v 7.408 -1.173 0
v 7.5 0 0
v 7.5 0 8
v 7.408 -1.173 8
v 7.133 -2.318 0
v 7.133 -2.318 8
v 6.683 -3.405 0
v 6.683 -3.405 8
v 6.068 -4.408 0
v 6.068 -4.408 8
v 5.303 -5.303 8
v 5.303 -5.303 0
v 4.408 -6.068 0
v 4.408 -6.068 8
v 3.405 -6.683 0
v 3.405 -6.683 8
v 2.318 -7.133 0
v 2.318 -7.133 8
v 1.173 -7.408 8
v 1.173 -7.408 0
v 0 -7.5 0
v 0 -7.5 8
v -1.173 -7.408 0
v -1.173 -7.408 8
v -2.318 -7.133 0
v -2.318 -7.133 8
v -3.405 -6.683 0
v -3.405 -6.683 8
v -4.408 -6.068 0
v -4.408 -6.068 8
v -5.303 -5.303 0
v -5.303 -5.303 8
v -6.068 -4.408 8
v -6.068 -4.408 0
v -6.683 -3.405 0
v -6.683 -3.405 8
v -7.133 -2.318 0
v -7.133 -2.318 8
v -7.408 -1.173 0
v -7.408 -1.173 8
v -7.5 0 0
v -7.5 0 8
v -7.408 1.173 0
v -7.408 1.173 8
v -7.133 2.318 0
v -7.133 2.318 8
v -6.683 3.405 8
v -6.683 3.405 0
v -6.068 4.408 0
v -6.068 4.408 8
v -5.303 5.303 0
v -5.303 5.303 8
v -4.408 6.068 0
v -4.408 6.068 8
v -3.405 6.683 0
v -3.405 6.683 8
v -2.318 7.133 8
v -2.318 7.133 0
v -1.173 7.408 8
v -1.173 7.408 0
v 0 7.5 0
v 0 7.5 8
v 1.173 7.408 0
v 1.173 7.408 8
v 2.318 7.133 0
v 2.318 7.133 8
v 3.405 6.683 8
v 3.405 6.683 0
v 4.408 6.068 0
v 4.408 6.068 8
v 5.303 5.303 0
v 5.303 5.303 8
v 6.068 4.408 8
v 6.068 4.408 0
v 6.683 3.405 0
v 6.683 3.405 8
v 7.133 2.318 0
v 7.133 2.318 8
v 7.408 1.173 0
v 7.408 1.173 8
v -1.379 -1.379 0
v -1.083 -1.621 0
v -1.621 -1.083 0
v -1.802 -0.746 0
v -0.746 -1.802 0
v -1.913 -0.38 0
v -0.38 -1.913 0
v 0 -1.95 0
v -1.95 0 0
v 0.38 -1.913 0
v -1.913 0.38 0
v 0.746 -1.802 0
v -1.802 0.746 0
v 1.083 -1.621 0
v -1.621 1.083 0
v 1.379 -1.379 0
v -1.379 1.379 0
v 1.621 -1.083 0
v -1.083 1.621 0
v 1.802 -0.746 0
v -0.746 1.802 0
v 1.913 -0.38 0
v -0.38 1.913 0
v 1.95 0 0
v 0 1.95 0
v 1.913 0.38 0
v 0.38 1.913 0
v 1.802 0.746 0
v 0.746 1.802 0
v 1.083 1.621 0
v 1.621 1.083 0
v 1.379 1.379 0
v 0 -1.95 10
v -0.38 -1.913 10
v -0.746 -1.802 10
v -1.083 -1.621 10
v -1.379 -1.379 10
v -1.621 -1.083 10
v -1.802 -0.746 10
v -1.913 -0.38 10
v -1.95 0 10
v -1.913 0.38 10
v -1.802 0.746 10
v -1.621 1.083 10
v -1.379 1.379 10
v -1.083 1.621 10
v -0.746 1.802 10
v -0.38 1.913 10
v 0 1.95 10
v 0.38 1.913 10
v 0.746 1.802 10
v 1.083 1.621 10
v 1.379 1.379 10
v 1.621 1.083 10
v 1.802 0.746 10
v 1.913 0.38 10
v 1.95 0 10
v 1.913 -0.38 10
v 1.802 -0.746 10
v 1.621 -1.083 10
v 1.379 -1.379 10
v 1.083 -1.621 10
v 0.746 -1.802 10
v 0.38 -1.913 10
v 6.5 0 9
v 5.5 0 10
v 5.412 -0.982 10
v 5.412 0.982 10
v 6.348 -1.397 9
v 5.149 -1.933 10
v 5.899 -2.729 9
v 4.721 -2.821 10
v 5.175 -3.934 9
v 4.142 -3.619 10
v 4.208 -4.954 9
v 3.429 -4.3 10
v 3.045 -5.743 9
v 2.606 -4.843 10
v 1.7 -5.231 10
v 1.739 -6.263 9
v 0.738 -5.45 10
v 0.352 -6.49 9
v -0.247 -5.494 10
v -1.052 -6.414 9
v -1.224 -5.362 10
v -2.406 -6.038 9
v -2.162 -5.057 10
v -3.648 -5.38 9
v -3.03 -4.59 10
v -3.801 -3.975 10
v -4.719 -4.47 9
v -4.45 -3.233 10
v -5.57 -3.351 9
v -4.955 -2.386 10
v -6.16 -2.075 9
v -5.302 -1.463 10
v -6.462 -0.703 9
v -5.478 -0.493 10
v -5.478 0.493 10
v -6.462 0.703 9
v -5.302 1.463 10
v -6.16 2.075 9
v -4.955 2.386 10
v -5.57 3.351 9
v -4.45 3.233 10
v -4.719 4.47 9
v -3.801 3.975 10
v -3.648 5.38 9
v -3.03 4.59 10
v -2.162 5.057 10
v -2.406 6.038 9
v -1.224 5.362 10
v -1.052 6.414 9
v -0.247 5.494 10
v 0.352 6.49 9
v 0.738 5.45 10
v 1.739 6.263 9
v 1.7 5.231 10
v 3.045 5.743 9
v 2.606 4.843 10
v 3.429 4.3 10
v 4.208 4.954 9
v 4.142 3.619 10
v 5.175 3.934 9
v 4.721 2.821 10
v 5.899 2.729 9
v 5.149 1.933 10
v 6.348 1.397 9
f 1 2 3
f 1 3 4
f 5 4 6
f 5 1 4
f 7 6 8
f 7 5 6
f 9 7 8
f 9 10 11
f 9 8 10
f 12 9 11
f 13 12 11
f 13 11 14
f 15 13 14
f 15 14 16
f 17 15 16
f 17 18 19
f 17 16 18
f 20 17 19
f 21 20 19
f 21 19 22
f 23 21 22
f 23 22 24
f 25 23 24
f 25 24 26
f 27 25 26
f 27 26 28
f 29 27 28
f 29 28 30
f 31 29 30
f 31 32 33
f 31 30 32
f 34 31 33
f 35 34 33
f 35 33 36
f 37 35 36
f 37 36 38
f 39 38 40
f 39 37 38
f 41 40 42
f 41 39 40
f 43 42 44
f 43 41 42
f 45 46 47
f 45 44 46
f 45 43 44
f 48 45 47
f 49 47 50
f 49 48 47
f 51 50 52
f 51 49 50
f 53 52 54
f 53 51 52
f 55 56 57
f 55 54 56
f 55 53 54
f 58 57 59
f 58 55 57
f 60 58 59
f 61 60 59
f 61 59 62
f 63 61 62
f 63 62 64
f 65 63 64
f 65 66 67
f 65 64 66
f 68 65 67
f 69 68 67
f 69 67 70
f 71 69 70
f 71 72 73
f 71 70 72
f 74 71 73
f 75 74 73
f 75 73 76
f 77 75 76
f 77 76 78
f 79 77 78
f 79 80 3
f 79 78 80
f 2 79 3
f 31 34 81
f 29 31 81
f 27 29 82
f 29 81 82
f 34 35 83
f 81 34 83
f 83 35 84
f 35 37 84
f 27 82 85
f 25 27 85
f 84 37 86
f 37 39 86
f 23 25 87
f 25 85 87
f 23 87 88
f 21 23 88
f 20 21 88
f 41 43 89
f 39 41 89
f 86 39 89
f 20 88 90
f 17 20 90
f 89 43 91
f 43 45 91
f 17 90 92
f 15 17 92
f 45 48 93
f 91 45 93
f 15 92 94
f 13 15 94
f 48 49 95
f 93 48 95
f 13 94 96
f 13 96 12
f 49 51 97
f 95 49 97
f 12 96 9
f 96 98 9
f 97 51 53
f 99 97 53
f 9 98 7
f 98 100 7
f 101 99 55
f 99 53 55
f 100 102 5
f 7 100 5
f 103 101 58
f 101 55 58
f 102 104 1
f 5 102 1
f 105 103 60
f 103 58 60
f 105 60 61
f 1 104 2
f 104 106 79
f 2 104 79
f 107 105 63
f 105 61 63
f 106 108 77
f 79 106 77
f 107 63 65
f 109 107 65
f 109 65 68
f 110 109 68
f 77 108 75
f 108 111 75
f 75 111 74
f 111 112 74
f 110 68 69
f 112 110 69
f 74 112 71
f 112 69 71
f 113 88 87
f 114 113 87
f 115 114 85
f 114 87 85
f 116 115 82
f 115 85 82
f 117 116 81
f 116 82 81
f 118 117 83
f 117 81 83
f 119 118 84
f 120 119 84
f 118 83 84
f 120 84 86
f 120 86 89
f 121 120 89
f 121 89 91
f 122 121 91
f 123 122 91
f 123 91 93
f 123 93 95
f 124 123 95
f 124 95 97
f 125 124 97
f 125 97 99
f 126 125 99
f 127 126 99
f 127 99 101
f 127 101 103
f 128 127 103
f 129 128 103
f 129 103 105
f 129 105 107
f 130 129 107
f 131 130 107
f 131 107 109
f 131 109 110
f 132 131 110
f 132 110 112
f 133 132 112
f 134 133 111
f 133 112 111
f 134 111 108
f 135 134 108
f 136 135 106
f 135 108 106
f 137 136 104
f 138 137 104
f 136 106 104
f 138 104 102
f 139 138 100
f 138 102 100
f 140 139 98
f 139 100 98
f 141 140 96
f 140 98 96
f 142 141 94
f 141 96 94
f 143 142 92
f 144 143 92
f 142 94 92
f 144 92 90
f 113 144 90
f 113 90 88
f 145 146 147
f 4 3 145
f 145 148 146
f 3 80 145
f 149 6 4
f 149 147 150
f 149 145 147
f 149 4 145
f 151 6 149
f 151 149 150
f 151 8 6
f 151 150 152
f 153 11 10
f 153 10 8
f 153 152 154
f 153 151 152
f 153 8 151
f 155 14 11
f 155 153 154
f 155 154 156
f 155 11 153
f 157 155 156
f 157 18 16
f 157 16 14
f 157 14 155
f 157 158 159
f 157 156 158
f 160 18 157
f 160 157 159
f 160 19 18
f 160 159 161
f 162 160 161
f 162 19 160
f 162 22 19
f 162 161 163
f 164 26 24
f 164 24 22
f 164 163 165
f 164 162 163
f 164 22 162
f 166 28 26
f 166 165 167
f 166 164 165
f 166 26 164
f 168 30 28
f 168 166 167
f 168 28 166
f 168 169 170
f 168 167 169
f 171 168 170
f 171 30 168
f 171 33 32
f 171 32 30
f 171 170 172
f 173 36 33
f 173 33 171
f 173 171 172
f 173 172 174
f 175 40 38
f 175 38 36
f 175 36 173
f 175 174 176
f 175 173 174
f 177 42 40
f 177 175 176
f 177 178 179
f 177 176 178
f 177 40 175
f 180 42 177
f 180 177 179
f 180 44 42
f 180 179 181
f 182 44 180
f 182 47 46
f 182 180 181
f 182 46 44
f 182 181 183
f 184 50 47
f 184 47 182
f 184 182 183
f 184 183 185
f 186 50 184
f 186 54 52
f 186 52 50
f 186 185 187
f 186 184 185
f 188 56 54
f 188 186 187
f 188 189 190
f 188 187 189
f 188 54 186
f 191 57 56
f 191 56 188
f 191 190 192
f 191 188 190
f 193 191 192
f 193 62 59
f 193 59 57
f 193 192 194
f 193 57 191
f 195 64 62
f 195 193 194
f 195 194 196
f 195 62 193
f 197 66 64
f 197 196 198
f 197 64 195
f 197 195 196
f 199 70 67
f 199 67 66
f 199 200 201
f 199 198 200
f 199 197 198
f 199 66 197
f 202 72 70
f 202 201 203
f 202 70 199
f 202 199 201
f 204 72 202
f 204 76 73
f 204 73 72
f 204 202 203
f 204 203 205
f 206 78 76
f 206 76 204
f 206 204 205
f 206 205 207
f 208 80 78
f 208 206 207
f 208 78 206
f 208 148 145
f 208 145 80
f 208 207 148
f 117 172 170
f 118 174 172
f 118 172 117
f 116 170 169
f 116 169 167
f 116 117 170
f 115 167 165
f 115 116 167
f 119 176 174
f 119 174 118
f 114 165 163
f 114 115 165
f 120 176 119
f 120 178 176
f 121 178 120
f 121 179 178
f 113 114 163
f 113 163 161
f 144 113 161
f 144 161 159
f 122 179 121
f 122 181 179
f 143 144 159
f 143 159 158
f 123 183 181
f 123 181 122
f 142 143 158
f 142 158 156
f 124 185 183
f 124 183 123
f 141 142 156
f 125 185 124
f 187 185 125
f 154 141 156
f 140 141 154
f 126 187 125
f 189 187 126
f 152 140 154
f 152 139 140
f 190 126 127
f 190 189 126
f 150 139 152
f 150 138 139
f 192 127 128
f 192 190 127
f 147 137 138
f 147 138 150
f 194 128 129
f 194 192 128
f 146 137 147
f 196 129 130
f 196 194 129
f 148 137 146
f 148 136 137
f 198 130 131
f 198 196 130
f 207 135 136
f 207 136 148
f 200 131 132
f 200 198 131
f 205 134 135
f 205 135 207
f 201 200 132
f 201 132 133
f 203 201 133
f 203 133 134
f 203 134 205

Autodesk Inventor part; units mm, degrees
ref_plane "YZ Plane" through (0, 0, 0) normal (1, 0, 0) x (0, 1, 0)
ref_plane "XZ Plane" through (0, 0, 0) normal (0, 1, 0) x (-1, 0, 0)
ref_plane "XY Plane" through (0, 0, 0) normal (0, 0, 1) x (1, 0, 0)
sketch "Эскиз1" plane through (0, 0, 0) normal (0, 0, 1) x (1, 0, 0)
  circle A0 centre (0, 0) radius 7.5
  dimension "d0" = 15
extrude "Выдавливание1" add sketch "Эскиз1" along normal blind 10
sketch "Эскиз2" plane through (0, 0, 10) normal (0, 0, 1) x (1, 0, 0)
  point P0 (0, 0)
hole "Отверстие1" at (0, 0, 10) direction (0, 0, -1) diameter 3.9 end through all
chamfer "Фаска1" distance 2 angle 45 1 edges at (-7.5, 0, 10)
properties part number "Упор_В2" material "По умолчанию1"
